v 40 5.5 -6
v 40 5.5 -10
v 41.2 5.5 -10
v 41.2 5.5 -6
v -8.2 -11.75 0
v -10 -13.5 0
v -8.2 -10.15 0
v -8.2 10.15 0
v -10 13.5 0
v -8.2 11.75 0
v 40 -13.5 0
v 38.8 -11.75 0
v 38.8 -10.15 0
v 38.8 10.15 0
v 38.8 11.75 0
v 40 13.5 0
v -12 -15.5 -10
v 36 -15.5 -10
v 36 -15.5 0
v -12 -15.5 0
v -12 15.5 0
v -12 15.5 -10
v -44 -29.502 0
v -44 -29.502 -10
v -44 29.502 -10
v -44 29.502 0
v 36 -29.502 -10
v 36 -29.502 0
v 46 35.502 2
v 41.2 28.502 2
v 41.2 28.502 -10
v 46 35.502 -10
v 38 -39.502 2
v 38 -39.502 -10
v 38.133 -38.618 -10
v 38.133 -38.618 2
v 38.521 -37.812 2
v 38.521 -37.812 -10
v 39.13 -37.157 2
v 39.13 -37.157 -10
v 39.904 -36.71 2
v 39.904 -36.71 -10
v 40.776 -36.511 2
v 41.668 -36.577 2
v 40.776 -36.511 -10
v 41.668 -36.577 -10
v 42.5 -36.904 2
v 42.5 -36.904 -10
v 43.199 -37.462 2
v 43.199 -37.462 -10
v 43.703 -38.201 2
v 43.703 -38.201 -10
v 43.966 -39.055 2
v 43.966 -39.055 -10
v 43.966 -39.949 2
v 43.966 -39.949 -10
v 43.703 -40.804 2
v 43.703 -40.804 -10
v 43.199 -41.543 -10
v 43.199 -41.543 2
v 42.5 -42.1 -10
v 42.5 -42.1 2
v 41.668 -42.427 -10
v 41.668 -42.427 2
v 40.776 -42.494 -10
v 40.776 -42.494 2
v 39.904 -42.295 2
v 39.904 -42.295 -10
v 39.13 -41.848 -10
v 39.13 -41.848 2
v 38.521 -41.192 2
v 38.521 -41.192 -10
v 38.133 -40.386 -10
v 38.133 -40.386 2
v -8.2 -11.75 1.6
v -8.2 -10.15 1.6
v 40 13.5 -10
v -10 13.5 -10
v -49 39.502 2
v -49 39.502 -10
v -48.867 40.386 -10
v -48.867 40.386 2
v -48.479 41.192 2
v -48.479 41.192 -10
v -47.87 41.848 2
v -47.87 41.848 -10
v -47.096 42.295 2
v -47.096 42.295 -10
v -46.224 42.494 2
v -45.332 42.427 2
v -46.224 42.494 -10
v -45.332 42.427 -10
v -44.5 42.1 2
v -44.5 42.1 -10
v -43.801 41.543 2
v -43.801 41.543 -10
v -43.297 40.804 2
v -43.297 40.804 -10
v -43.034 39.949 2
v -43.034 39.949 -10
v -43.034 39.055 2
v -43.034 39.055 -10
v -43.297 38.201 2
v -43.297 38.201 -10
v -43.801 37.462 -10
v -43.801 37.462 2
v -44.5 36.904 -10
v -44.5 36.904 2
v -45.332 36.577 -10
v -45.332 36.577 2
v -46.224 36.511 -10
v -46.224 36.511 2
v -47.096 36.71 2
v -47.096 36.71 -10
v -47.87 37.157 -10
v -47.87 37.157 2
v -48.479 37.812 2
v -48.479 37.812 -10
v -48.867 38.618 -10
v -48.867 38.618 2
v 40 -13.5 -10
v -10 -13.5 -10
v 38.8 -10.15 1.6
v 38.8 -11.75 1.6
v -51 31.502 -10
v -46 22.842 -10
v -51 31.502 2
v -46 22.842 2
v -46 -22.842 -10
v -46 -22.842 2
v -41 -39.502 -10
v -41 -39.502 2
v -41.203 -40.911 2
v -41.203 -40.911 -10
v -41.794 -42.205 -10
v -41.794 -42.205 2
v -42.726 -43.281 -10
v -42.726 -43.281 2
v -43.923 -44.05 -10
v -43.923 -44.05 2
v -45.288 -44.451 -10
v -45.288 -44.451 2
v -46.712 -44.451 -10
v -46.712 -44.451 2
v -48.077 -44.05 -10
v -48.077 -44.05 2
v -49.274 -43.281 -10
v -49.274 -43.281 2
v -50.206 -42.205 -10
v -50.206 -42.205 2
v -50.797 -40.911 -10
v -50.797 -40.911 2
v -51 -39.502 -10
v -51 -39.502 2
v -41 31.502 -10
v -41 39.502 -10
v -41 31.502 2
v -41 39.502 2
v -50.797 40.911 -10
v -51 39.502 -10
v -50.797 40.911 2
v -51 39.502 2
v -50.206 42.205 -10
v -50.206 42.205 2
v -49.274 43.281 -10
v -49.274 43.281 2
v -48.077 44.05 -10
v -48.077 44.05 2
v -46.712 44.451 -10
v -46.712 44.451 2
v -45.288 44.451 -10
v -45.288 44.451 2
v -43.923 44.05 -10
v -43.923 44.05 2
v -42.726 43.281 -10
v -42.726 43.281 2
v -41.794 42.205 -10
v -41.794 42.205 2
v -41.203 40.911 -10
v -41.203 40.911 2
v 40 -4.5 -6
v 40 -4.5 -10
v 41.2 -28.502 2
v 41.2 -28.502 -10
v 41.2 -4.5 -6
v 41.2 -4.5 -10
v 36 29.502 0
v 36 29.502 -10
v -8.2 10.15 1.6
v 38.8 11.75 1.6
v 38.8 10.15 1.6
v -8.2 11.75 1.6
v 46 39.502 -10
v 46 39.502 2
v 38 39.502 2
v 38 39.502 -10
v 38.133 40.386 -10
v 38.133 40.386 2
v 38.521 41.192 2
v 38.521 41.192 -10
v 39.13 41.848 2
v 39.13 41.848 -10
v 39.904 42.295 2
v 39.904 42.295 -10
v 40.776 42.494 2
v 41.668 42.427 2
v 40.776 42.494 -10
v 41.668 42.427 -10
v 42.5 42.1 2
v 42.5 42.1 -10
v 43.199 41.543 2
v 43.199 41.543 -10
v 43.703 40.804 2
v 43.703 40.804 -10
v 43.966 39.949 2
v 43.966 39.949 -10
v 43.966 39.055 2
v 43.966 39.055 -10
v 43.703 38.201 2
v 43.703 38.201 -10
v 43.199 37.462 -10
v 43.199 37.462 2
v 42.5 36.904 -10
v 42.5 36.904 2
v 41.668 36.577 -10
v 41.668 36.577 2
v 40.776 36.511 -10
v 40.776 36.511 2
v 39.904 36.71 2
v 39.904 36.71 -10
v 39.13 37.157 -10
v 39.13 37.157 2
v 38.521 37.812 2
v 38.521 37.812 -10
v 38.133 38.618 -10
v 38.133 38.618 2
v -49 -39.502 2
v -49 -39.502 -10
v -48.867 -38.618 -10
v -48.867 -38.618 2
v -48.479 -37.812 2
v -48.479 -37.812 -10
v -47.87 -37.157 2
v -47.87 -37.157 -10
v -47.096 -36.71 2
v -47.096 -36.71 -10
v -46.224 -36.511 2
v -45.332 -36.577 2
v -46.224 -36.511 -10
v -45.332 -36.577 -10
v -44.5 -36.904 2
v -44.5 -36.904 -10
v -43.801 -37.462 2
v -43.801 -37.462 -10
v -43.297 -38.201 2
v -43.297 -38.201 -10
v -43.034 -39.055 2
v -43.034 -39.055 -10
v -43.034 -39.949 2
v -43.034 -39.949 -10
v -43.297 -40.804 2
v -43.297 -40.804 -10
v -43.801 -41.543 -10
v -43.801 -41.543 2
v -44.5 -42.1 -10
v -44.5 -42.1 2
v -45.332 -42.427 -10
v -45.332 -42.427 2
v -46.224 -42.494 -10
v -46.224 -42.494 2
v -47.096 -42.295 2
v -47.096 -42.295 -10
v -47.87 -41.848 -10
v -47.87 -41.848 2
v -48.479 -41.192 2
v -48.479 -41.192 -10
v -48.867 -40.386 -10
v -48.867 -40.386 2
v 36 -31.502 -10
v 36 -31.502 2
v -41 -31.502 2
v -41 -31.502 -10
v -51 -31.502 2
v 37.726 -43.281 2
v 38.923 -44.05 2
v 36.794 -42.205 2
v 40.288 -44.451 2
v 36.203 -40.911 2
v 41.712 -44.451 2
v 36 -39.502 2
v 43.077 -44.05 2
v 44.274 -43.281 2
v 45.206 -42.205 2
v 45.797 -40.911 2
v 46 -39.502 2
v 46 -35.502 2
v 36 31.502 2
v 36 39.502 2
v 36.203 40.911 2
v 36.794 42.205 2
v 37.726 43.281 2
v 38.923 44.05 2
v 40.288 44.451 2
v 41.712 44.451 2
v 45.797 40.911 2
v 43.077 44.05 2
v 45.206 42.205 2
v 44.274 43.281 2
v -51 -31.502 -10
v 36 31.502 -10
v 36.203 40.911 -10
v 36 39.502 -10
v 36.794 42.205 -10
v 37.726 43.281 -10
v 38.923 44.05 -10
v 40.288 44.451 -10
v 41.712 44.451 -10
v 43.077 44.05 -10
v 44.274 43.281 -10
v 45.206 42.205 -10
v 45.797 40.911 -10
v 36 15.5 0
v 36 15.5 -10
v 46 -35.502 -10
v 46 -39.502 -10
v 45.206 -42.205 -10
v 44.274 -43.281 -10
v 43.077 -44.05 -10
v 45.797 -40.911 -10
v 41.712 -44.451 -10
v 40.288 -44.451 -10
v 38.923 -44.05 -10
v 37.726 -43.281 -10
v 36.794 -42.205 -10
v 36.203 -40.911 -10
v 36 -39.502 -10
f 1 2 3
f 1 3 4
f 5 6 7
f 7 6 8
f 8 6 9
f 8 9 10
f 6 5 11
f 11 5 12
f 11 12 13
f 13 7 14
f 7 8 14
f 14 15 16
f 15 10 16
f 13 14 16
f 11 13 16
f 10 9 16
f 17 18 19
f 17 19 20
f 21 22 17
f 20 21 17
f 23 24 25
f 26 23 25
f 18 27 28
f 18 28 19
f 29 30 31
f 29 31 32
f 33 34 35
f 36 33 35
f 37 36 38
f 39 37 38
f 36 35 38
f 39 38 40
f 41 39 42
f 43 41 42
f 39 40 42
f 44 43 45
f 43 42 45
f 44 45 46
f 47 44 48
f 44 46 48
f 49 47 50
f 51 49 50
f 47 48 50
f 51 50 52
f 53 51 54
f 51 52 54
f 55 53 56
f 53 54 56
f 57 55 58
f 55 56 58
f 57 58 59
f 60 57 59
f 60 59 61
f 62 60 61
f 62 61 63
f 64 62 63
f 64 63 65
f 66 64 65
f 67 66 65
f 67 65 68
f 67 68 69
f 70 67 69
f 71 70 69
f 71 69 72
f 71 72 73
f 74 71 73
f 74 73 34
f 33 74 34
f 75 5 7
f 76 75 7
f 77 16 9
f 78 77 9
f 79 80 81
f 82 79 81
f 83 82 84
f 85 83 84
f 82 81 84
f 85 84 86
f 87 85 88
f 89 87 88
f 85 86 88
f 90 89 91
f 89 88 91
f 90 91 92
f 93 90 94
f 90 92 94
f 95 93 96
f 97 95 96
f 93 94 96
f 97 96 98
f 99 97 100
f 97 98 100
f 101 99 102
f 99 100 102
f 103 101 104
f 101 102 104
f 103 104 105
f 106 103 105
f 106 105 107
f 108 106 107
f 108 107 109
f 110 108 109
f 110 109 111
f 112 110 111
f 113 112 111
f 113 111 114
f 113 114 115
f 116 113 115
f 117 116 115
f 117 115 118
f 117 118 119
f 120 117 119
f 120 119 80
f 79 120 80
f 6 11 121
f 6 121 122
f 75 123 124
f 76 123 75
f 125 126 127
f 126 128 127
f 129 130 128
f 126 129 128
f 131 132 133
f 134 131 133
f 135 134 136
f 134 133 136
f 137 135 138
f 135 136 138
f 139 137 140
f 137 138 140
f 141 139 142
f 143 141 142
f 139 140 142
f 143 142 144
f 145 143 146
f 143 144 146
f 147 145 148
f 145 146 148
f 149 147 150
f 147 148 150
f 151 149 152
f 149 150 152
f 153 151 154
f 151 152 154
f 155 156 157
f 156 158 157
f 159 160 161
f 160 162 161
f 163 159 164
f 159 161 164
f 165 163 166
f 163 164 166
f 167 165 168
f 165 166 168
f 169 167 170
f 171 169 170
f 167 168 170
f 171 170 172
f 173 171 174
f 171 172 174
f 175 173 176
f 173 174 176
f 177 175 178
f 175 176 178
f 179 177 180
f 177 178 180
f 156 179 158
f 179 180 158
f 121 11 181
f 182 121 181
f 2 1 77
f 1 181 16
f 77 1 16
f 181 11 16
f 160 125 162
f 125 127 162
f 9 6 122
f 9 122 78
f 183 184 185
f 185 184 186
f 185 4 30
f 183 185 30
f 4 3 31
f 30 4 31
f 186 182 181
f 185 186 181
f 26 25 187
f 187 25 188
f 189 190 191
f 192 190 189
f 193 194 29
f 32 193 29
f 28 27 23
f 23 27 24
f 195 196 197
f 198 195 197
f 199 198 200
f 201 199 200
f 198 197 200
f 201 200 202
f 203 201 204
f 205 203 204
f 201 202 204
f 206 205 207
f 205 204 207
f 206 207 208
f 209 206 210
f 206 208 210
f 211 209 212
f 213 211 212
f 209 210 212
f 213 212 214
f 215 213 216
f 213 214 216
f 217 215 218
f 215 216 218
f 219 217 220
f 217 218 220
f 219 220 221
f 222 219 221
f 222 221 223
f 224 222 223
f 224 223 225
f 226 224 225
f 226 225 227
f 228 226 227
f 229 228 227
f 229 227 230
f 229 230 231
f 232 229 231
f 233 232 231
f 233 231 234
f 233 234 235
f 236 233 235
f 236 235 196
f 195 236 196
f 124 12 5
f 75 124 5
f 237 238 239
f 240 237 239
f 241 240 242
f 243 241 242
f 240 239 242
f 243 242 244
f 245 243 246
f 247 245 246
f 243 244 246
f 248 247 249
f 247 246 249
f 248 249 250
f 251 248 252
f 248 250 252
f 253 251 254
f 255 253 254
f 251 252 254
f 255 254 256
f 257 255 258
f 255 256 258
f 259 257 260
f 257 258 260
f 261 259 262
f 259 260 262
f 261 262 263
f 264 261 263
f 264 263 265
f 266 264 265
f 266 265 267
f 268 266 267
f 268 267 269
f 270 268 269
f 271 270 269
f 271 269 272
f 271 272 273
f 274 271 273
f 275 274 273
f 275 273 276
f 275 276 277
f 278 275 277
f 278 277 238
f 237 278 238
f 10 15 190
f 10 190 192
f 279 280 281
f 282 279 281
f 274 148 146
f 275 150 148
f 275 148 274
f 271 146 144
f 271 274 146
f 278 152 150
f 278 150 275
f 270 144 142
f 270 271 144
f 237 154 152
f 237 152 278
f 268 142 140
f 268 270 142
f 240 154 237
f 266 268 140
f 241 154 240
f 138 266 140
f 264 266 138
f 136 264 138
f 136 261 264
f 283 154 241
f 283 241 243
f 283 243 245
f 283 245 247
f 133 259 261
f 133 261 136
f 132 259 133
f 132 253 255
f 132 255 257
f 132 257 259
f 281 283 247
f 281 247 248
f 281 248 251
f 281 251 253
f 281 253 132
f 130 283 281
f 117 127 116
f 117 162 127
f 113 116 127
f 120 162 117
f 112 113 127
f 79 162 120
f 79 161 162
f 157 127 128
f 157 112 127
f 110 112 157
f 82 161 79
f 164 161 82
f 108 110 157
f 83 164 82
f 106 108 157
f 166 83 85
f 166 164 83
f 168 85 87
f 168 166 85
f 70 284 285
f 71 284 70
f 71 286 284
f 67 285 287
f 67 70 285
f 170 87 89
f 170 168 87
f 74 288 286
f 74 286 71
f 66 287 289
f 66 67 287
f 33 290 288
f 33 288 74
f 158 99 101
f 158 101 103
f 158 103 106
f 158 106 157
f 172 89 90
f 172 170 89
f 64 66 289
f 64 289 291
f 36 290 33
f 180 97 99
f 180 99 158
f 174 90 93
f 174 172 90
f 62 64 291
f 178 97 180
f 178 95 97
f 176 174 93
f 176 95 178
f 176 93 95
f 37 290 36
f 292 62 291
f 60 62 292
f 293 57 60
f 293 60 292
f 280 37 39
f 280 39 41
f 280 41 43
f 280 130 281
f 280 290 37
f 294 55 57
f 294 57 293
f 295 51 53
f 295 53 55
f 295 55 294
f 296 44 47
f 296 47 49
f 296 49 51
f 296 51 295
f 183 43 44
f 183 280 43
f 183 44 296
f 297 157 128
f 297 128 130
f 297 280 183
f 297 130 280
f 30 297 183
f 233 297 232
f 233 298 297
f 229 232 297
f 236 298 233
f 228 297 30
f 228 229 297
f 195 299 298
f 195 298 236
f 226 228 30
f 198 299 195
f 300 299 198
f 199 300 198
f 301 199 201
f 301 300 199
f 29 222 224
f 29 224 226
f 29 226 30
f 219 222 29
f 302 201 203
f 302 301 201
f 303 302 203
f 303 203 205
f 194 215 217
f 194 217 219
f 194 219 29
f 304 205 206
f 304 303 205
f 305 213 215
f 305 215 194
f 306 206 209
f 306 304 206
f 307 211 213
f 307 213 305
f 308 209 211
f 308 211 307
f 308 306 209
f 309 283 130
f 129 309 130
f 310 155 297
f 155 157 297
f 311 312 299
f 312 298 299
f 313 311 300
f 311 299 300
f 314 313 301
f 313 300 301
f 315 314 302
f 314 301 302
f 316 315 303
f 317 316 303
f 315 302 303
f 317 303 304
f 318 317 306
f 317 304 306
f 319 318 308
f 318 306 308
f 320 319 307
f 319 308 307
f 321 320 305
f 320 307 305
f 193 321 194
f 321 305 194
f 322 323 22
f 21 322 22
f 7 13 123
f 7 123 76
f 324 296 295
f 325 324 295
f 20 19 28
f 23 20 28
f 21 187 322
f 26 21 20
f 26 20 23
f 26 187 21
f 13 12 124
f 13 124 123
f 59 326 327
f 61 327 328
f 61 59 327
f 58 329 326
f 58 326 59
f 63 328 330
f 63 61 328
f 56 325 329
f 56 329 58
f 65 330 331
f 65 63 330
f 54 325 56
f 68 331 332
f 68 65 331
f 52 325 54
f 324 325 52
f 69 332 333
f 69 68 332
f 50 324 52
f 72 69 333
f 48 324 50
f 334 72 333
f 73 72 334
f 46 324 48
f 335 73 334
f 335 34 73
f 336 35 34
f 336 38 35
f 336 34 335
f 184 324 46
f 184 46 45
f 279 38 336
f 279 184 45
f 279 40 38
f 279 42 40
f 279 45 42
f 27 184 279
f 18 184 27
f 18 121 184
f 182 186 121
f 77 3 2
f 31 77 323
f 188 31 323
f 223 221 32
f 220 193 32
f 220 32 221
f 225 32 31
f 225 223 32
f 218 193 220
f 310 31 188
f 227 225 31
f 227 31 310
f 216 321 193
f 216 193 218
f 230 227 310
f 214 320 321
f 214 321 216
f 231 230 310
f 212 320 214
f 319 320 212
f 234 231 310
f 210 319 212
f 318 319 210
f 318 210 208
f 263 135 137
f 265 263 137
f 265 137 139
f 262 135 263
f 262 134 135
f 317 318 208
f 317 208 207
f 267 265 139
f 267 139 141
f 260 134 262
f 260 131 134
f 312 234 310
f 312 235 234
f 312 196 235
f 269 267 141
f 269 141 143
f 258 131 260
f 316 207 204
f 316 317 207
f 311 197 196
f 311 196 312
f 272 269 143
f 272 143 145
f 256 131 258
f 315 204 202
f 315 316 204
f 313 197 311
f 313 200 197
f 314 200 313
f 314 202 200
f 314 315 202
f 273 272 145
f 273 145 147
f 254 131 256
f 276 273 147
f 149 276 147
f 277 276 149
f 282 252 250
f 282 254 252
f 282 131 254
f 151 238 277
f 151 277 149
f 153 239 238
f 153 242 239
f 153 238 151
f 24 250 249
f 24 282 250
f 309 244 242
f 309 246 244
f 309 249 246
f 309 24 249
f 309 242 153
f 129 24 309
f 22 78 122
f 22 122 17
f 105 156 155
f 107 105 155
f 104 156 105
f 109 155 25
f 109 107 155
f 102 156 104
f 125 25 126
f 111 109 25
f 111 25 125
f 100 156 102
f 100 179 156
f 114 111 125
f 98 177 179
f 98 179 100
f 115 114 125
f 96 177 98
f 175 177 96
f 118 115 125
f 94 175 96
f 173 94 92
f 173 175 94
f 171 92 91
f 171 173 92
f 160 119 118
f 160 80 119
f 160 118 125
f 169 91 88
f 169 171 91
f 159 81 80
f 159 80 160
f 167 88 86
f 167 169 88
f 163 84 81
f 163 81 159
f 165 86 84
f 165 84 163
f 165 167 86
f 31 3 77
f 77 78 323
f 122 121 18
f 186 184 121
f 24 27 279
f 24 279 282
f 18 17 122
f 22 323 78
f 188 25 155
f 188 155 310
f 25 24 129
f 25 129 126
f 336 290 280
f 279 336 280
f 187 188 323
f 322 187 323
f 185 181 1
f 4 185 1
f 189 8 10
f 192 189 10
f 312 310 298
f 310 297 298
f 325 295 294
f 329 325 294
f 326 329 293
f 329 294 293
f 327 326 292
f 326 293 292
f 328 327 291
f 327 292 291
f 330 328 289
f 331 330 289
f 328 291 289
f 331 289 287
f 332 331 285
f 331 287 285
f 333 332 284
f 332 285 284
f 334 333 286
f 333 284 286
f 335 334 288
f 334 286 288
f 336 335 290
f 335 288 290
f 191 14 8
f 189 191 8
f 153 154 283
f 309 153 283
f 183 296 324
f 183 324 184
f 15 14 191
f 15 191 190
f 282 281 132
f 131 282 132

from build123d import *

# Parameters (mm, degrees)
EXTRUDE_1_DEPTH     = 2
SKETCH_2_W          = 50
SKETCH_2_H          = 27
EXTRUDE_2_DEPTH     = 10
SKETCH_3_R          = 3
CUT_EXTRUDE_1_DEPTH = 13
SKETCH_5_W          = 47
SKETCH_5_H          = 1.6
CUT_EXTRUDE_2_DEPTH = 1.6
SKETCH_6_W          = 4
SKETCH_6_H          = 10
CUT_EXTRUDE_3_DEPTH = 7
SKETCH_7_W          = 80
SKETCH_7_H          = 14.002207555
CUT_EXTRUDE_4_DEPTH = 10
CUT_EXTRUDE_5_REACH = 14


with BuildPart() as part:
    # 草图1 → 凸台-拉伸1 (new body)
    with BuildSketch(Plane.XY):
        with BuildLine():
            Line((-46, 22.841953517), (-46, -22.841953517))
            Line((-46, -22.841953517), (-51, -31.502207555))
            Line((-51, -31.502207555), (-51, -39.502207555))
            ThreePointArc((-51, -39.502207555), (-46, -44.502207555), (-41, -39.502207555))
            Line((-41, -39.502207555), (-41, -31.502207555))
            Line((-41, -31.502207555), (36, -31.502207555))
            Line((36, -31.502207555), (36, -39.502207555))
            ThreePointArc((36, -39.502207555), (41, -44.502207555), (46, -39.502207555))
            Line((46, -39.502207555), (46, 39.502207555))
            ThreePointArc((46, 39.502207555), (41, 44.502207555), (36, 39.502207555))
            Line((36, 39.502207555), (36, 31.502207555))
            Line((36, 31.502207555), (-41, 31.502207555))
            Line((-41, 31.502207555), (-41, 39.502207555))
            ThreePointArc((-41, 39.502207555), (-46, 44.502207555), (-51, 39.502207555))
            Line((-51, 39.502207555), (-51, 31.502207555))
            Line((-51, 31.502207555), (-46, 22.841953517))
        make_face()
    extrude(amount=EXTRUDE_1_DEPTH)

    # 草图2 → 凸台-拉伸2 (add)
    with BuildSketch(Plane(origin=(0, 0, 0), x_dir=(-1, 0, 0), z_dir=(0, 0, -1))):
        with BuildLine():
            Line((46, -22.841953517), (46, 22.841953517))
            Line((46, 22.841953517), (51, 31.502207555))
            Line((51, 31.502207555), (51, 39.502207555))
            ThreePointArc((51, 39.502207555), (46, 44.502207555), (41, 39.502207555))
            Line((41, 39.502207555), (41, 31.502207555))
            Line((41, 31.502207555), (-36, 31.502207555))
            Line((-36, 31.502207555), (-36, 39.502207555))
            ThreePointArc((-36, 39.502207555), (-41, 44.502207555), (-46, 39.502207555))
            Line((-46, 39.502207555), (-46, -39.502207555))
            ThreePointArc((-46, -39.502207555), (-41, -44.502207555), (-36, -39.502207555))
            Line((-36, -39.502207555), (-36, -31.502207555))
            Line((-36, -31.502207555), (41, -31.502207555))
            Line((41, -31.502207555), (41, -39.502207555))
            ThreePointArc((41, -39.502207555), (46, -44.502207555), (51, -39.502207555))
            Line((51, -39.502207555), (51, -31.502207555))
            Line((51, -31.502207555), (46, -22.841953517))
        make_face()
        with Locations((-15, 0)):
            Rectangle(SKETCH_2_W, SKETCH_2_H, mode=Mode.SUBTRACT)
    extrude(amount=EXTRUDE_2_DEPTH)

    # 草图3 → 切除-拉伸1 (cut, through all)
    with BuildSketch(Plane(origin=(0, 0, -10), x_dir=(-1, 0, 0), z_dir=(0, 0, -1))):
        with Locations((-41, 39.502207555)):
            Circle(SKETCH_3_R)
        with Locations((46, -39.502207555)):
            Circle(SKETCH_3_R)
        with Locations((46, 39.502207555)):
            Circle(SKETCH_3_R)
        with Locations((-41, -39.502207555)):
            Circle(SKETCH_3_R)
    extrude(amount=-CUT_EXTRUDE_1_DEPTH, mode=Mode.SUBTRACT)

    # 草图5 → 切除-拉伸2 (cut)
    with BuildSketch(Plane(origin=(0, 0, 0), x_dir=(-1, 0, 0), z_dir=(0, 0, -1))):
        with Locations((-15.3, 10.95)):
            Rectangle(SKETCH_5_W, SKETCH_5_H)
        with Locations((-15.3, -10.95)):
            Rectangle(SKETCH_5_W, SKETCH_5_H)
    extrude(amount=-CUT_EXTRUDE_2_DEPTH, mode=Mode.SUBTRACT)

    # 草图6 → 切除-拉伸3 (cut, through all)
    with BuildSketch(Plane.ZY.offset(-40)):
        with Locations((-8, 0.5)):
            Rectangle(SKETCH_6_W, SKETCH_6_H)
    extrude(amount=-CUT_EXTRUDE_3_DEPTH, mode=Mode.SUBTRACT)

    # 草图7 → 切除-拉伸4 (cut)
    with BuildSketch(Plane(origin=(0, 0, -10), x_dir=(-1, 0, 0), z_dir=(0, 0, -1))):
        with Locations((4, -22.501103778)):
            Rectangle(SKETCH_7_W, SKETCH_7_H)
        Polygon((12, -15.5), (44, -15.5), (44, 29.502207555), (-36, 29.502207555), (-36, 15.5), (12, 15.5), align=None)
    extrude(amount=-CUT_EXTRUDE_4_DEPTH, mode=Mode.SUBTRACT)

    # 草图9 → 切除-拉伸5 (cut, up to next)
    with BuildSketch(Plane(origin=(0, 0, -10), x_dir=(-1, 0, 0), z_dir=(0, 0, -1)), mode=Mode.PRIVATE) as cut_extrude_5_sk1:
        Polygon((-46, -35.502207555), (-41.2, -28.502207555), (-41.2, 28.502207555), (-46, 35.502207555), align=None)
    cut_extrude_5_tool1 = extrude(cut_extrude_5_sk1.sketch, amount=-CUT_EXTRUDE_5_REACH, mode=Mode.PRIVATE) & part.part
    add(cut_extrude_5_tool1.solids().sort_by_distance((43.687494, 0, -10))[0], mode=Mode.SUBTRACT)


solid = part.part
